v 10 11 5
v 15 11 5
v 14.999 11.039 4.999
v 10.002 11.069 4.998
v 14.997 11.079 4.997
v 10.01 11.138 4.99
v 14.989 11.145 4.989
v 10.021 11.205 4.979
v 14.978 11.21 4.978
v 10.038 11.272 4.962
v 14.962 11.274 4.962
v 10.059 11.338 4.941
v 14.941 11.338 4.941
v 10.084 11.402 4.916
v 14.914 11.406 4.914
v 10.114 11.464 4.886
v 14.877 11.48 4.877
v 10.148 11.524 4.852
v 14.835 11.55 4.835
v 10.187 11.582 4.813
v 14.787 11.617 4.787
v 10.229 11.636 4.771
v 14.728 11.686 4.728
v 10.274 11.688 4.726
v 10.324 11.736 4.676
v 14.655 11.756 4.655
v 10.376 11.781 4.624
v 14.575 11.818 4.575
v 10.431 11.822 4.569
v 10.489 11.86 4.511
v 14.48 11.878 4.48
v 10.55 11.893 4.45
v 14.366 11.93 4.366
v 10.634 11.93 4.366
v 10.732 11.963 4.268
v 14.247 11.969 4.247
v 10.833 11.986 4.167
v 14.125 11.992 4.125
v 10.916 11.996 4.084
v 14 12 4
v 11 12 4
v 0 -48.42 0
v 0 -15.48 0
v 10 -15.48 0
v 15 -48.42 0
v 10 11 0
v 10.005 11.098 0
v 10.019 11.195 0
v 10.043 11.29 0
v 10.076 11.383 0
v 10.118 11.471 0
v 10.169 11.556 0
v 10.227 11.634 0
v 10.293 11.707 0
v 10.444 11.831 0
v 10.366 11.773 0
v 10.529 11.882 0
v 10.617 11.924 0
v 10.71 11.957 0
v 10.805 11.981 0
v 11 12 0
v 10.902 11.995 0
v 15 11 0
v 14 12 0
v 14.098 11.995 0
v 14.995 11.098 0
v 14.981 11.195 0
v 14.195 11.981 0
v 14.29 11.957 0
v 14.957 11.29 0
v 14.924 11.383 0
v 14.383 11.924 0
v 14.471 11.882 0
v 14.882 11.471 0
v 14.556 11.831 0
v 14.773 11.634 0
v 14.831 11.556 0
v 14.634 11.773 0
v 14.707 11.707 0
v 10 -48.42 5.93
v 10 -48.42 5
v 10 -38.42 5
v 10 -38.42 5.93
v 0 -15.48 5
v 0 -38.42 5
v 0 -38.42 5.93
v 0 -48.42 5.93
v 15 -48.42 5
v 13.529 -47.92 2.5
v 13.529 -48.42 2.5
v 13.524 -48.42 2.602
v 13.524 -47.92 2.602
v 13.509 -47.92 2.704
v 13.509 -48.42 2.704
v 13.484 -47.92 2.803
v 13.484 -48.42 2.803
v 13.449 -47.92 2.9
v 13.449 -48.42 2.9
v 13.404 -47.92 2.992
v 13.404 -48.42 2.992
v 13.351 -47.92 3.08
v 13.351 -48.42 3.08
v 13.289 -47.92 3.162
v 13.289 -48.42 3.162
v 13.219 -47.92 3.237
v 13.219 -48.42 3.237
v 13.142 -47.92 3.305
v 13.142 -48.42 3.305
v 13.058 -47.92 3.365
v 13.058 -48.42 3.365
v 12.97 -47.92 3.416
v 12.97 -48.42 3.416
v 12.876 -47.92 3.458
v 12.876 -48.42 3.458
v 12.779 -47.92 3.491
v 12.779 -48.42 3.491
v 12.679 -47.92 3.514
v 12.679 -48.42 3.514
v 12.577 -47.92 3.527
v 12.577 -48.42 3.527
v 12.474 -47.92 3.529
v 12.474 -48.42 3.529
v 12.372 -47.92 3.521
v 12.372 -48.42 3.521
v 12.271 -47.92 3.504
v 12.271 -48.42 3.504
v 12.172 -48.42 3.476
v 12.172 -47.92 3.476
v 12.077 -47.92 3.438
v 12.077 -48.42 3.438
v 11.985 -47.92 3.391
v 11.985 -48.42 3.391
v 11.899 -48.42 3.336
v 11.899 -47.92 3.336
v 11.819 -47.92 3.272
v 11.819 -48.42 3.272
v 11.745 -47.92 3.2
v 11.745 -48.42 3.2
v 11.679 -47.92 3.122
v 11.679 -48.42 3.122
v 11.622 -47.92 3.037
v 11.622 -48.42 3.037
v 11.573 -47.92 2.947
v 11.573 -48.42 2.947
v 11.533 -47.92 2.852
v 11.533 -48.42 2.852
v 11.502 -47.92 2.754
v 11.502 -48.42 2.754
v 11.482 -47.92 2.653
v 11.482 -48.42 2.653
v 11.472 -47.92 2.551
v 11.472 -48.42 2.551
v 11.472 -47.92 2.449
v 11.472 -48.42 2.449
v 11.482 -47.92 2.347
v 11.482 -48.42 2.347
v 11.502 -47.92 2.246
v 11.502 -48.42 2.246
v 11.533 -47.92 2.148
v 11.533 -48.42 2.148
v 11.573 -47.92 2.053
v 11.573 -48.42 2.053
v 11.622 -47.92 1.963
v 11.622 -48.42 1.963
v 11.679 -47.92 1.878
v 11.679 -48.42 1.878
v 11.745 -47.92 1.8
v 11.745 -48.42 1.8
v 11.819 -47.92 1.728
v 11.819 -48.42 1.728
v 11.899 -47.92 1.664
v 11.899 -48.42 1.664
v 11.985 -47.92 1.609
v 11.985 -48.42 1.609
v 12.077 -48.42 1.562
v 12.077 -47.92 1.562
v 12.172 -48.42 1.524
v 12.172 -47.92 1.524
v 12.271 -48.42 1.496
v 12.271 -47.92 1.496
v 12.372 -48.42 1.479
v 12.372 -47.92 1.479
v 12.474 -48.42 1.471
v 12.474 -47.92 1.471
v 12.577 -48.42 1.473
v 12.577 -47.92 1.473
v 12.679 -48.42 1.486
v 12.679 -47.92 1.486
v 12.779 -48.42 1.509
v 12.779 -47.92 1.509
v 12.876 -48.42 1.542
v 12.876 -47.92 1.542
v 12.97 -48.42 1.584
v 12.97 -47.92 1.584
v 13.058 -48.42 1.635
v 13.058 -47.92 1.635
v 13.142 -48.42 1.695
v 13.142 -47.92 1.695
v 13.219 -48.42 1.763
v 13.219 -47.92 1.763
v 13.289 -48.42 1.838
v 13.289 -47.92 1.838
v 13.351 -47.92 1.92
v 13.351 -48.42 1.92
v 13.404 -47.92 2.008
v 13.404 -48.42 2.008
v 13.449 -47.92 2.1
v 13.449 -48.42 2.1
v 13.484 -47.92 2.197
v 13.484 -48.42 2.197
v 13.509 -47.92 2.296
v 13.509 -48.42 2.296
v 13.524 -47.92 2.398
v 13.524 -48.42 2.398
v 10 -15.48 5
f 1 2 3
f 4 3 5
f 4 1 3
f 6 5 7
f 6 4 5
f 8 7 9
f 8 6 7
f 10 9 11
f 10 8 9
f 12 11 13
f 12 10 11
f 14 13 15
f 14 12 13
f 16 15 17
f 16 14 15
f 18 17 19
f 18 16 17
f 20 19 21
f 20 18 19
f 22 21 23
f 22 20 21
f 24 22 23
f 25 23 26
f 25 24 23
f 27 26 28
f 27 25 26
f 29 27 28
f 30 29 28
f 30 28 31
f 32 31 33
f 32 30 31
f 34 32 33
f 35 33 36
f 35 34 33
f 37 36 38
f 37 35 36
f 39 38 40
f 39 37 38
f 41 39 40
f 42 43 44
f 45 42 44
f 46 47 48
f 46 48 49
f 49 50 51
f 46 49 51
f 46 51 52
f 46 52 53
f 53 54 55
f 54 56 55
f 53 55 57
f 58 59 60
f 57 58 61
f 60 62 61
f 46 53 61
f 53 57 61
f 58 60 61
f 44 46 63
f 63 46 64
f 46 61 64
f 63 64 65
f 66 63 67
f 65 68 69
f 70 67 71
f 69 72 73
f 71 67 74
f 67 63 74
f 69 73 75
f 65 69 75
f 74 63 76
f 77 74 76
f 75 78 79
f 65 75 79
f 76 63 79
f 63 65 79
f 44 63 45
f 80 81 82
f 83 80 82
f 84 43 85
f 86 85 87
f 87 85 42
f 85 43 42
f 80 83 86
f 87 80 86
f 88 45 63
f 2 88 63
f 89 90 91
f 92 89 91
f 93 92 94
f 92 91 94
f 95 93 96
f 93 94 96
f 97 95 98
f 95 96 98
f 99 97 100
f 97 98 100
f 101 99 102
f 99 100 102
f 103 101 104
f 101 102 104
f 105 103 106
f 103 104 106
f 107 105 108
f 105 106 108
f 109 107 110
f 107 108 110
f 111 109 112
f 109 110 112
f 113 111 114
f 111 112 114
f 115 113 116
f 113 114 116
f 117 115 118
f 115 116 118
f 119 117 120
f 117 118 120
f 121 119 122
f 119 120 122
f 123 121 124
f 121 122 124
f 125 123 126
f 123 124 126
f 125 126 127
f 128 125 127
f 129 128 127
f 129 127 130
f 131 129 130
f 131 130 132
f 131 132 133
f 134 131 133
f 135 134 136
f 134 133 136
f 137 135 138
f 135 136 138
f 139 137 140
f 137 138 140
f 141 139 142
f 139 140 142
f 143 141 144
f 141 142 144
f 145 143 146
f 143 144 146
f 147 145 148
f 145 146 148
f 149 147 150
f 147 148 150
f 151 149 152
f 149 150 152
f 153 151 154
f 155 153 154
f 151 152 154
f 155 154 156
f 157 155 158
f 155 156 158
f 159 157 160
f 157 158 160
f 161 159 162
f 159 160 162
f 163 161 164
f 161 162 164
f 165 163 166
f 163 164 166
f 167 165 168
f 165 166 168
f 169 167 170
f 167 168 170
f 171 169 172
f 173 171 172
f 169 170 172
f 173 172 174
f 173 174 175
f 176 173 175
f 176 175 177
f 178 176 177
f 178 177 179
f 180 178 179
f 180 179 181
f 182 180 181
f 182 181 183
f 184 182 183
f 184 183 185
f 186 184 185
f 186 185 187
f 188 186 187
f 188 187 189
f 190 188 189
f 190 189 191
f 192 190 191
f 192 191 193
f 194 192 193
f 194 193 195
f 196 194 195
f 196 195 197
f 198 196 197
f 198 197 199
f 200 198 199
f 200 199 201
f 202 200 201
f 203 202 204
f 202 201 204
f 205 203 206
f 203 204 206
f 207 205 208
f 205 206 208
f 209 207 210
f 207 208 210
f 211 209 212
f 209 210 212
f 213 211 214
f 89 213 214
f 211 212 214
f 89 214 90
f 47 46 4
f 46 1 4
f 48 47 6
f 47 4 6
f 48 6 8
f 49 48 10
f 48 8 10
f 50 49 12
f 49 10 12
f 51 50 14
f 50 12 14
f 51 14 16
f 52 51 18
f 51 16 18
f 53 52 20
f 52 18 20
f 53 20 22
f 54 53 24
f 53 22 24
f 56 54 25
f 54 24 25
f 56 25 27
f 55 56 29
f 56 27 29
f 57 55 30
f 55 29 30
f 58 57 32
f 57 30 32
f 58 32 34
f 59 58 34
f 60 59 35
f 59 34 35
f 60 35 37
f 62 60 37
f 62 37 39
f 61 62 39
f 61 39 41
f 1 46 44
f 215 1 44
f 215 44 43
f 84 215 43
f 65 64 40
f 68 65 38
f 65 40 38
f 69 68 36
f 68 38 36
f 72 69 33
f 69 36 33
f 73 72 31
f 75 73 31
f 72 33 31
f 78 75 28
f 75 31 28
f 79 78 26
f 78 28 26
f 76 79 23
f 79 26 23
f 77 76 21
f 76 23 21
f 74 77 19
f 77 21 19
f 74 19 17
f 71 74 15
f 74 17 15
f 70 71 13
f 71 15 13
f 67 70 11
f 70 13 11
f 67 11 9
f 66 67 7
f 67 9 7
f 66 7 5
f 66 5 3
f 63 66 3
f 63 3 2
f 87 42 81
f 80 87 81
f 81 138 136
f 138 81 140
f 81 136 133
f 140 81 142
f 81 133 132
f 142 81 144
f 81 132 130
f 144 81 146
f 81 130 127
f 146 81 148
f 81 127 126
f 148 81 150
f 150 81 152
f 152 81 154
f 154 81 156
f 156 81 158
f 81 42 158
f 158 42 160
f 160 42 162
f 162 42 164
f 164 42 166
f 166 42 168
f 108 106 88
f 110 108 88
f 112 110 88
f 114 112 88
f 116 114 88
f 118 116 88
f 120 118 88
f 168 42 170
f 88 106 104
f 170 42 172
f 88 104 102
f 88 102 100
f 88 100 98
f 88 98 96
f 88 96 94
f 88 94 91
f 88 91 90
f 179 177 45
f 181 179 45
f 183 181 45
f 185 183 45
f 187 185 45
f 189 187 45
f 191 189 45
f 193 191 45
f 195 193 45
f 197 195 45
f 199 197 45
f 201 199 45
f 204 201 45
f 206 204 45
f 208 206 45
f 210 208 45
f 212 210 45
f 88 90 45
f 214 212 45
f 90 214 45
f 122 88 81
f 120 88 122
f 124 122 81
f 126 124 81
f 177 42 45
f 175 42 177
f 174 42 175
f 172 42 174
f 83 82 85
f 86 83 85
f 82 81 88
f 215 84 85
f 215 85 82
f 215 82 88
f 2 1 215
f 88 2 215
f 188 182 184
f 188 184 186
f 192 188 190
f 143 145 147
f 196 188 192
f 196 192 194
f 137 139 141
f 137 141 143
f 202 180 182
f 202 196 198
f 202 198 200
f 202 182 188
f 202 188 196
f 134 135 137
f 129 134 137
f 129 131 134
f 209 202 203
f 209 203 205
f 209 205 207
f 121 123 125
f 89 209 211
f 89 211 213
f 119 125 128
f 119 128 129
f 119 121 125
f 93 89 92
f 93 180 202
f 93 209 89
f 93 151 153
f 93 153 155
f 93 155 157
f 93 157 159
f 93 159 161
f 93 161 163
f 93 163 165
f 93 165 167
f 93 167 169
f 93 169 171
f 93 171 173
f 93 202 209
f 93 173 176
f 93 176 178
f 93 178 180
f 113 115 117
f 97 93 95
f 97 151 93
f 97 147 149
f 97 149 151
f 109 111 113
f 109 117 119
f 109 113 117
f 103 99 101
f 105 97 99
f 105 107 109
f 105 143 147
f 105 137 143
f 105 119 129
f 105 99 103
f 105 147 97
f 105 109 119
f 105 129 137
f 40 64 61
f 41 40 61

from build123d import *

# Parameters (mm, degrees)
BOSS_EXTRUDE1_DEPTH = 5
SKETCH2_W           = 10
SKETCH2_H           = 10
BOSS_EXTRUDE2_DEPTH = 5.93
FILLET1_R           = 1
SKETCH3_R           = 1.029396526
CUT_EXTRUDE1_DEPTH  = 0.5


with BuildPart() as part:
    # Sketch1 → Boss-Extrude1 (new body)
    with BuildSketch(Plane.XY):
        Polygon((10, 12), (10, -15.48), (0, -15.48), (0, -48.42), (15, -48.42), (15, 12), align=None)
    extrude(amount=BOSS_EXTRUDE1_DEPTH)

    # Sketch2 → Boss-Extrude2 (add)
    with BuildSketch(Plane(origin=(0, 0, 0), x_dir=(-1, 0, 0), z_dir=(0, 0, -1))):
        with Locations((-5, -43.42)):
            Rectangle(SKETCH2_W, SKETCH2_H)
    extrude(amount=-BOSS_EXTRUDE2_DEPTH)

    # Fillet1
    fillet1_edges = [part.edges().sort_by_distance(p)[0] for p in [
        (10, 12, 2.5),
        (15, 12, 2.5),
        (12.5, 12, 5),
    ]]
    fillet(fillet1_edges, radius=FILLET1_R)

    # Sketch3 → Cut-Extrude1 (cut)
    with BuildSketch(Plane.XZ.offset(48.42)):
        with Locations((12.5, 2.5)):
            Circle(SKETCH3_R)
    extrude(amount=-CUT_EXTRUDE1_DEPTH, mode=Mode.SUBTRACT)


solid = part.part
